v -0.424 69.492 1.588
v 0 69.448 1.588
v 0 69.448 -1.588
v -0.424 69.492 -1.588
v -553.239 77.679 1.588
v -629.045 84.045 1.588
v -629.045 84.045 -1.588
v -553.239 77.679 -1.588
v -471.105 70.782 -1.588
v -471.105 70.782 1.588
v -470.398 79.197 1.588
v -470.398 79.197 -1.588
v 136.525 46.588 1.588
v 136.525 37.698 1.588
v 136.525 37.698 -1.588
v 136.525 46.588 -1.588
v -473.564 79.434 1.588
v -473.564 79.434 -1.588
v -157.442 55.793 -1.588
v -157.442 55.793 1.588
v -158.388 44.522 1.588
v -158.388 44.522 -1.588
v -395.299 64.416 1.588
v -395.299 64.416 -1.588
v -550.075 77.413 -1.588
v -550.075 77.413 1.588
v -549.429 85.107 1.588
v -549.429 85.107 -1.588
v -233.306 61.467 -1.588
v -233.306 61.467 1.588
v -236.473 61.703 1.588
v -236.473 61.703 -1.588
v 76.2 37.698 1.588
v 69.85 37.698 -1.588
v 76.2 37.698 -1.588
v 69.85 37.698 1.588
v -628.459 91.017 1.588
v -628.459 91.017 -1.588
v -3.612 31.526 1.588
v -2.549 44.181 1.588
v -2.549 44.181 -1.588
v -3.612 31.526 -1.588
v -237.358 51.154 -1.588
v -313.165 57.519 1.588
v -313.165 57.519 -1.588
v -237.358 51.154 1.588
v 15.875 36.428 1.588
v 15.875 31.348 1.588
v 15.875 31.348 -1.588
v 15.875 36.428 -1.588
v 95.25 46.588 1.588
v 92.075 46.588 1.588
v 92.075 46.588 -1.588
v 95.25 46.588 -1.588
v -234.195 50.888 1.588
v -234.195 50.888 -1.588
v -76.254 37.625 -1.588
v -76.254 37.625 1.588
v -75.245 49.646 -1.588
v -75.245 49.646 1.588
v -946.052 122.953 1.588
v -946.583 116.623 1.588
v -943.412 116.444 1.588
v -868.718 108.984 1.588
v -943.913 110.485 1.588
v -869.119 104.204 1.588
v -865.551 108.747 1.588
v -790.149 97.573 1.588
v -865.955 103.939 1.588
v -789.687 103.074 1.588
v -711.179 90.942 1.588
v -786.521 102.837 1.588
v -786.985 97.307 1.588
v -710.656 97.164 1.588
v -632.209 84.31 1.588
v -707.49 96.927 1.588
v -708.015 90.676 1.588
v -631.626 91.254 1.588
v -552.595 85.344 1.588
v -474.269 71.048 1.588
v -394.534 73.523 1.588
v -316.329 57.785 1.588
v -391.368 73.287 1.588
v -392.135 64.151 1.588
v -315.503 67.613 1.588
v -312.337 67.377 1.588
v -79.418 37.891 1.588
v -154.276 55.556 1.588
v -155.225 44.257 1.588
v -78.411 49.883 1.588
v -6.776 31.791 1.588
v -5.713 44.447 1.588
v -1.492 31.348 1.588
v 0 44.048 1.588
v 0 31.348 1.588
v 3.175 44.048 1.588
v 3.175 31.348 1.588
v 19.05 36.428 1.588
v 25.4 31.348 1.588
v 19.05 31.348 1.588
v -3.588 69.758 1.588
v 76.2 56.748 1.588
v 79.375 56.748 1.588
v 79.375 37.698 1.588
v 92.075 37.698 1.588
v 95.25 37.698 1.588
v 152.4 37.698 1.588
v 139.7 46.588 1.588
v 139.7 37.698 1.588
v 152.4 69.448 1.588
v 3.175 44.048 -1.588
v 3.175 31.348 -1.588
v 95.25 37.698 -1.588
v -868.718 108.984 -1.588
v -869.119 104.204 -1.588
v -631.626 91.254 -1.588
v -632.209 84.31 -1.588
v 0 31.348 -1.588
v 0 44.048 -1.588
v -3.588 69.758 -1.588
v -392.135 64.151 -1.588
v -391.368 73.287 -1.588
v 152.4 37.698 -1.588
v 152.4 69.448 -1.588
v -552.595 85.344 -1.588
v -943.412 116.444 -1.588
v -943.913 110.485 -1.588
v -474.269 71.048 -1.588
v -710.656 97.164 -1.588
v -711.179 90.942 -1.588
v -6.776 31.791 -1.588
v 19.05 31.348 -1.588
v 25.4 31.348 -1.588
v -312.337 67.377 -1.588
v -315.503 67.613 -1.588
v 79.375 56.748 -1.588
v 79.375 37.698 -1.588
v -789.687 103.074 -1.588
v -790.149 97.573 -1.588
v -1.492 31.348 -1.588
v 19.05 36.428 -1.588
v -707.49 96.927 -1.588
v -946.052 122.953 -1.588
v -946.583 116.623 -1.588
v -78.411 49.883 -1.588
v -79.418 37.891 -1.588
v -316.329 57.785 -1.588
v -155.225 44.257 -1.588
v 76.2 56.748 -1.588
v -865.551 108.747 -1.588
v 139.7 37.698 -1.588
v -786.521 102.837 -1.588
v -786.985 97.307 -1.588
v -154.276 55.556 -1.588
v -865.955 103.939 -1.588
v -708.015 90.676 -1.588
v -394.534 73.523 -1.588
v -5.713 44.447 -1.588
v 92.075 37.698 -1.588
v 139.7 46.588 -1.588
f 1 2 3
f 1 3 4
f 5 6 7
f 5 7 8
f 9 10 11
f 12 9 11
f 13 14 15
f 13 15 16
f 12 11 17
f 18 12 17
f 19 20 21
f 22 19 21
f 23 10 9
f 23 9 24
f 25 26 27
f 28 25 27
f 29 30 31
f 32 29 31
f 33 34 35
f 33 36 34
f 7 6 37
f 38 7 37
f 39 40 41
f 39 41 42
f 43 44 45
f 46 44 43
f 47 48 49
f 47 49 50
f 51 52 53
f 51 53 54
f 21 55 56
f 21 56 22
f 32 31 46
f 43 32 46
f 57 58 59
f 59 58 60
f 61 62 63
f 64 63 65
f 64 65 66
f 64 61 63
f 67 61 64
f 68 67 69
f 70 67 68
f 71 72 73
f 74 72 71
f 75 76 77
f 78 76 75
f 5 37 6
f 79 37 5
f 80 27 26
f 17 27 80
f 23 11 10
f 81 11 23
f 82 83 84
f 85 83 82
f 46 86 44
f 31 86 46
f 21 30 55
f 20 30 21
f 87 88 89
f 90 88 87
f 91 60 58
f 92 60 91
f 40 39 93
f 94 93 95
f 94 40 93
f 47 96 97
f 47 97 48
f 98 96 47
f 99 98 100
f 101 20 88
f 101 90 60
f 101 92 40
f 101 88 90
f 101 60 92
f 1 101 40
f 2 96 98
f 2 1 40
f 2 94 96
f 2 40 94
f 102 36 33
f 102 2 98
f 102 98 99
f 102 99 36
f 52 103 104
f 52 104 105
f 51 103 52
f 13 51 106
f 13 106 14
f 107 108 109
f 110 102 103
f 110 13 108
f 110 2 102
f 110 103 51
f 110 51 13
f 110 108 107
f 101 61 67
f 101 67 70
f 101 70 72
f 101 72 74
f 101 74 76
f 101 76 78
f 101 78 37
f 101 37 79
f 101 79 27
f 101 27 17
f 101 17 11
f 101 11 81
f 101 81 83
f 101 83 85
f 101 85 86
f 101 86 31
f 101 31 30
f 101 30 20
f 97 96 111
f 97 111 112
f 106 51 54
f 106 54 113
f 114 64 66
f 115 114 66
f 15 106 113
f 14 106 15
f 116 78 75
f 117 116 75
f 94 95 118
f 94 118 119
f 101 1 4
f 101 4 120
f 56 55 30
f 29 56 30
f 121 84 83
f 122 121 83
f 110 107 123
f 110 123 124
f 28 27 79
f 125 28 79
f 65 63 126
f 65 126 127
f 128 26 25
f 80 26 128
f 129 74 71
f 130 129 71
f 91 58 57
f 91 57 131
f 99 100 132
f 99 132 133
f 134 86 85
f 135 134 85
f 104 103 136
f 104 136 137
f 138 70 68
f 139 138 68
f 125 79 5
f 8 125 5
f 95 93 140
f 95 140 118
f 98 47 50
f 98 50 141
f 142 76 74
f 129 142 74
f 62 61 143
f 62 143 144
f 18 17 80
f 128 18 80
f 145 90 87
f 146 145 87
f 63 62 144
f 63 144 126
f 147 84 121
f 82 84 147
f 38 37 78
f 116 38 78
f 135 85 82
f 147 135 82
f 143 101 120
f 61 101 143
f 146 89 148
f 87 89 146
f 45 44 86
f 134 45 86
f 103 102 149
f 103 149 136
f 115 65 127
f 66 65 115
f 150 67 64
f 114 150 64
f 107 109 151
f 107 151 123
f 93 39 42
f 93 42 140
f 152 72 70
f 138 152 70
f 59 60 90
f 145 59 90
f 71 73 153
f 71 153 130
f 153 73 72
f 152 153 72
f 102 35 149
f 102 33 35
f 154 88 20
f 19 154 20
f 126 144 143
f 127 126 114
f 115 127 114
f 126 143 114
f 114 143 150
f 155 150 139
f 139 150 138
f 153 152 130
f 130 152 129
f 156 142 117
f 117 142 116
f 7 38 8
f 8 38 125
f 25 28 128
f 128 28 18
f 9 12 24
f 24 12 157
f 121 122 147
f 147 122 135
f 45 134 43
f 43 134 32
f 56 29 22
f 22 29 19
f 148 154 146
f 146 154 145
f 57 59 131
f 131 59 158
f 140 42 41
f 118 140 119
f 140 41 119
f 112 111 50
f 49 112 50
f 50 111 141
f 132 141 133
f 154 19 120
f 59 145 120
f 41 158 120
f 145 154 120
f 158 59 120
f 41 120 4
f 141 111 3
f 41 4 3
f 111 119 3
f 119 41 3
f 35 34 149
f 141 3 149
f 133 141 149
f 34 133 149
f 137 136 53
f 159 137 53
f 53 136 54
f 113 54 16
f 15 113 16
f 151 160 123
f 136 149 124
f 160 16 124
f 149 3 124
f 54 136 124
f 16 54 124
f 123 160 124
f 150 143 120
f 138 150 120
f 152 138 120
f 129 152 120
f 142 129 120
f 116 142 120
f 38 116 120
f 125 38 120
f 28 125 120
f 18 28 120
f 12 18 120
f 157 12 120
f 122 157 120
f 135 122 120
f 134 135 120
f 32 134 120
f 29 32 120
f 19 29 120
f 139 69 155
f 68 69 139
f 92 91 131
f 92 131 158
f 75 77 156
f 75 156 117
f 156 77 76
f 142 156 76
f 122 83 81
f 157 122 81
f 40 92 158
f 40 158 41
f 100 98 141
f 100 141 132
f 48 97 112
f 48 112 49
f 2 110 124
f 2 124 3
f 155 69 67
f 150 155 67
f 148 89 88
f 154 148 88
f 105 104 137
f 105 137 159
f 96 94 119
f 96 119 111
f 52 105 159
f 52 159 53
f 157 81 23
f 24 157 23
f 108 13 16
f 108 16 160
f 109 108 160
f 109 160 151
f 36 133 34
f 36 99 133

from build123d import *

# Parameters (mm, degrees)
BOSS_EXTRUDE1_DEPTH = 1.5875
CUT_EXTRUDE1_DEPTH  = 4.175


with BuildPart() as part:
    # Sketch1 → Boss-Extrude1 (new body, symmetric)
    with BuildSketch(Plane.XY):
        Polygon((76.2, 37.697541537), (76.2, 56.747541537), (79.375, 56.747541537), (79.375, 37.697541537), (92.075, 37.697541537), (92.075, 46.587541537), (95.25, 46.587541537), (95.25, 37.697541537), (136.525, 37.697541537), (136.525, 46.587541537), (139.7, 46.587541537), (139.7, 37.697541537), (152.4, 37.697541537), (152.4, 69.447541537), (0, 69.447541537), (-0.423998633, 69.491926731), (-3.587863461, 69.757603883), (-946.051908629, 122.953392794), (-946.583462345, 116.623288424), (-943.412318182, 116.444298555), (-943.91275138, 110.48479854), (-6.775989292, 31.791225946), (-5.713280681, 44.446685258), (-2.549415853, 44.181008106), (-3.612124464, 31.525548794), (-1.492292584, 31.347541537), (0, 31.347541537), (0, 44.047541537), (3.175, 44.047541537), (3.175, 31.347541537), (15.875, 31.347541537), (15.875, 36.427541537), (19.05, 36.427541537), (19.05, 31.347541537), (25.4, 31.347541537), (69.85, 37.697541537), align=None)
    extrude(amount=BOSS_EXTRUDE1_DEPTH, both=True)

    # Sketch2 → Cut-Extrude1 (cut, through all)
    with BuildSketch(Plane.XY.offset(1.5875)):
        Polygon((-76.254460917, 37.625496217), (-75.245037036, 49.646404609), (-78.411328309, 49.883186), (-79.418325745, 37.891173369), align=None)
        Polygon((-155.224527027, 44.256797945), (-154.27566721, 55.556468134), (-157.441958483, 55.793249525), (-158.388391855, 44.522475098), align=None)
        Polygon((-234.194593137, 50.888099674), (-233.306297384, 61.466531659), (-236.472588657, 61.70331305), (-237.358457965, 51.153776826), align=None)
        Polygon((-313.164659247, 57.519401402), (-312.336927558, 67.376595183), (-315.503218831, 67.613376574), (-316.328524075, 57.785078555), align=None)
        Polygon((-392.134725356, 64.15070313), (-391.367557732, 73.286658708), (-394.533849005, 73.523440099), (-395.298590185, 64.416380283), align=None)
        Polygon((-471.104791466, 70.782004859), (-470.398187906, 79.196722233), (-473.564479179, 79.433503624), (-474.268656294, 71.047682011), align=None)
        Polygon((-550.074857576, 77.413306587), (-549.42881808, 85.106785757), (-552.595109353, 85.343567149), (-553.238722404, 77.67898374), align=None)
        Polygon((-629.044923686, 84.044608316), (-628.459448254, 91.016849282), (-631.625739527, 91.253630673), (-632.208788514, 84.310285468), align=None)
        Polygon((-708.014989796, 90.675910044), (-707.490078428, 96.926912807), (-710.656369701, 97.163694198), (-711.178854624, 90.941587197), align=None)
        Polygon((-786.985055905, 97.307211772), (-786.520708602, 102.836976331), (-789.686999875, 103.073757723), (-790.148920734, 97.572888925), align=None)
        Polygon((-865.955122015, 103.938513501), (-865.551338776, 108.747039856), (-868.717630049, 108.983821247), (-869.118986843, 104.204190653), align=None)
    extrude(amount=-CUT_EXTRUDE1_DEPTH, mode=Mode.SUBTRACT)


solid = part.part
